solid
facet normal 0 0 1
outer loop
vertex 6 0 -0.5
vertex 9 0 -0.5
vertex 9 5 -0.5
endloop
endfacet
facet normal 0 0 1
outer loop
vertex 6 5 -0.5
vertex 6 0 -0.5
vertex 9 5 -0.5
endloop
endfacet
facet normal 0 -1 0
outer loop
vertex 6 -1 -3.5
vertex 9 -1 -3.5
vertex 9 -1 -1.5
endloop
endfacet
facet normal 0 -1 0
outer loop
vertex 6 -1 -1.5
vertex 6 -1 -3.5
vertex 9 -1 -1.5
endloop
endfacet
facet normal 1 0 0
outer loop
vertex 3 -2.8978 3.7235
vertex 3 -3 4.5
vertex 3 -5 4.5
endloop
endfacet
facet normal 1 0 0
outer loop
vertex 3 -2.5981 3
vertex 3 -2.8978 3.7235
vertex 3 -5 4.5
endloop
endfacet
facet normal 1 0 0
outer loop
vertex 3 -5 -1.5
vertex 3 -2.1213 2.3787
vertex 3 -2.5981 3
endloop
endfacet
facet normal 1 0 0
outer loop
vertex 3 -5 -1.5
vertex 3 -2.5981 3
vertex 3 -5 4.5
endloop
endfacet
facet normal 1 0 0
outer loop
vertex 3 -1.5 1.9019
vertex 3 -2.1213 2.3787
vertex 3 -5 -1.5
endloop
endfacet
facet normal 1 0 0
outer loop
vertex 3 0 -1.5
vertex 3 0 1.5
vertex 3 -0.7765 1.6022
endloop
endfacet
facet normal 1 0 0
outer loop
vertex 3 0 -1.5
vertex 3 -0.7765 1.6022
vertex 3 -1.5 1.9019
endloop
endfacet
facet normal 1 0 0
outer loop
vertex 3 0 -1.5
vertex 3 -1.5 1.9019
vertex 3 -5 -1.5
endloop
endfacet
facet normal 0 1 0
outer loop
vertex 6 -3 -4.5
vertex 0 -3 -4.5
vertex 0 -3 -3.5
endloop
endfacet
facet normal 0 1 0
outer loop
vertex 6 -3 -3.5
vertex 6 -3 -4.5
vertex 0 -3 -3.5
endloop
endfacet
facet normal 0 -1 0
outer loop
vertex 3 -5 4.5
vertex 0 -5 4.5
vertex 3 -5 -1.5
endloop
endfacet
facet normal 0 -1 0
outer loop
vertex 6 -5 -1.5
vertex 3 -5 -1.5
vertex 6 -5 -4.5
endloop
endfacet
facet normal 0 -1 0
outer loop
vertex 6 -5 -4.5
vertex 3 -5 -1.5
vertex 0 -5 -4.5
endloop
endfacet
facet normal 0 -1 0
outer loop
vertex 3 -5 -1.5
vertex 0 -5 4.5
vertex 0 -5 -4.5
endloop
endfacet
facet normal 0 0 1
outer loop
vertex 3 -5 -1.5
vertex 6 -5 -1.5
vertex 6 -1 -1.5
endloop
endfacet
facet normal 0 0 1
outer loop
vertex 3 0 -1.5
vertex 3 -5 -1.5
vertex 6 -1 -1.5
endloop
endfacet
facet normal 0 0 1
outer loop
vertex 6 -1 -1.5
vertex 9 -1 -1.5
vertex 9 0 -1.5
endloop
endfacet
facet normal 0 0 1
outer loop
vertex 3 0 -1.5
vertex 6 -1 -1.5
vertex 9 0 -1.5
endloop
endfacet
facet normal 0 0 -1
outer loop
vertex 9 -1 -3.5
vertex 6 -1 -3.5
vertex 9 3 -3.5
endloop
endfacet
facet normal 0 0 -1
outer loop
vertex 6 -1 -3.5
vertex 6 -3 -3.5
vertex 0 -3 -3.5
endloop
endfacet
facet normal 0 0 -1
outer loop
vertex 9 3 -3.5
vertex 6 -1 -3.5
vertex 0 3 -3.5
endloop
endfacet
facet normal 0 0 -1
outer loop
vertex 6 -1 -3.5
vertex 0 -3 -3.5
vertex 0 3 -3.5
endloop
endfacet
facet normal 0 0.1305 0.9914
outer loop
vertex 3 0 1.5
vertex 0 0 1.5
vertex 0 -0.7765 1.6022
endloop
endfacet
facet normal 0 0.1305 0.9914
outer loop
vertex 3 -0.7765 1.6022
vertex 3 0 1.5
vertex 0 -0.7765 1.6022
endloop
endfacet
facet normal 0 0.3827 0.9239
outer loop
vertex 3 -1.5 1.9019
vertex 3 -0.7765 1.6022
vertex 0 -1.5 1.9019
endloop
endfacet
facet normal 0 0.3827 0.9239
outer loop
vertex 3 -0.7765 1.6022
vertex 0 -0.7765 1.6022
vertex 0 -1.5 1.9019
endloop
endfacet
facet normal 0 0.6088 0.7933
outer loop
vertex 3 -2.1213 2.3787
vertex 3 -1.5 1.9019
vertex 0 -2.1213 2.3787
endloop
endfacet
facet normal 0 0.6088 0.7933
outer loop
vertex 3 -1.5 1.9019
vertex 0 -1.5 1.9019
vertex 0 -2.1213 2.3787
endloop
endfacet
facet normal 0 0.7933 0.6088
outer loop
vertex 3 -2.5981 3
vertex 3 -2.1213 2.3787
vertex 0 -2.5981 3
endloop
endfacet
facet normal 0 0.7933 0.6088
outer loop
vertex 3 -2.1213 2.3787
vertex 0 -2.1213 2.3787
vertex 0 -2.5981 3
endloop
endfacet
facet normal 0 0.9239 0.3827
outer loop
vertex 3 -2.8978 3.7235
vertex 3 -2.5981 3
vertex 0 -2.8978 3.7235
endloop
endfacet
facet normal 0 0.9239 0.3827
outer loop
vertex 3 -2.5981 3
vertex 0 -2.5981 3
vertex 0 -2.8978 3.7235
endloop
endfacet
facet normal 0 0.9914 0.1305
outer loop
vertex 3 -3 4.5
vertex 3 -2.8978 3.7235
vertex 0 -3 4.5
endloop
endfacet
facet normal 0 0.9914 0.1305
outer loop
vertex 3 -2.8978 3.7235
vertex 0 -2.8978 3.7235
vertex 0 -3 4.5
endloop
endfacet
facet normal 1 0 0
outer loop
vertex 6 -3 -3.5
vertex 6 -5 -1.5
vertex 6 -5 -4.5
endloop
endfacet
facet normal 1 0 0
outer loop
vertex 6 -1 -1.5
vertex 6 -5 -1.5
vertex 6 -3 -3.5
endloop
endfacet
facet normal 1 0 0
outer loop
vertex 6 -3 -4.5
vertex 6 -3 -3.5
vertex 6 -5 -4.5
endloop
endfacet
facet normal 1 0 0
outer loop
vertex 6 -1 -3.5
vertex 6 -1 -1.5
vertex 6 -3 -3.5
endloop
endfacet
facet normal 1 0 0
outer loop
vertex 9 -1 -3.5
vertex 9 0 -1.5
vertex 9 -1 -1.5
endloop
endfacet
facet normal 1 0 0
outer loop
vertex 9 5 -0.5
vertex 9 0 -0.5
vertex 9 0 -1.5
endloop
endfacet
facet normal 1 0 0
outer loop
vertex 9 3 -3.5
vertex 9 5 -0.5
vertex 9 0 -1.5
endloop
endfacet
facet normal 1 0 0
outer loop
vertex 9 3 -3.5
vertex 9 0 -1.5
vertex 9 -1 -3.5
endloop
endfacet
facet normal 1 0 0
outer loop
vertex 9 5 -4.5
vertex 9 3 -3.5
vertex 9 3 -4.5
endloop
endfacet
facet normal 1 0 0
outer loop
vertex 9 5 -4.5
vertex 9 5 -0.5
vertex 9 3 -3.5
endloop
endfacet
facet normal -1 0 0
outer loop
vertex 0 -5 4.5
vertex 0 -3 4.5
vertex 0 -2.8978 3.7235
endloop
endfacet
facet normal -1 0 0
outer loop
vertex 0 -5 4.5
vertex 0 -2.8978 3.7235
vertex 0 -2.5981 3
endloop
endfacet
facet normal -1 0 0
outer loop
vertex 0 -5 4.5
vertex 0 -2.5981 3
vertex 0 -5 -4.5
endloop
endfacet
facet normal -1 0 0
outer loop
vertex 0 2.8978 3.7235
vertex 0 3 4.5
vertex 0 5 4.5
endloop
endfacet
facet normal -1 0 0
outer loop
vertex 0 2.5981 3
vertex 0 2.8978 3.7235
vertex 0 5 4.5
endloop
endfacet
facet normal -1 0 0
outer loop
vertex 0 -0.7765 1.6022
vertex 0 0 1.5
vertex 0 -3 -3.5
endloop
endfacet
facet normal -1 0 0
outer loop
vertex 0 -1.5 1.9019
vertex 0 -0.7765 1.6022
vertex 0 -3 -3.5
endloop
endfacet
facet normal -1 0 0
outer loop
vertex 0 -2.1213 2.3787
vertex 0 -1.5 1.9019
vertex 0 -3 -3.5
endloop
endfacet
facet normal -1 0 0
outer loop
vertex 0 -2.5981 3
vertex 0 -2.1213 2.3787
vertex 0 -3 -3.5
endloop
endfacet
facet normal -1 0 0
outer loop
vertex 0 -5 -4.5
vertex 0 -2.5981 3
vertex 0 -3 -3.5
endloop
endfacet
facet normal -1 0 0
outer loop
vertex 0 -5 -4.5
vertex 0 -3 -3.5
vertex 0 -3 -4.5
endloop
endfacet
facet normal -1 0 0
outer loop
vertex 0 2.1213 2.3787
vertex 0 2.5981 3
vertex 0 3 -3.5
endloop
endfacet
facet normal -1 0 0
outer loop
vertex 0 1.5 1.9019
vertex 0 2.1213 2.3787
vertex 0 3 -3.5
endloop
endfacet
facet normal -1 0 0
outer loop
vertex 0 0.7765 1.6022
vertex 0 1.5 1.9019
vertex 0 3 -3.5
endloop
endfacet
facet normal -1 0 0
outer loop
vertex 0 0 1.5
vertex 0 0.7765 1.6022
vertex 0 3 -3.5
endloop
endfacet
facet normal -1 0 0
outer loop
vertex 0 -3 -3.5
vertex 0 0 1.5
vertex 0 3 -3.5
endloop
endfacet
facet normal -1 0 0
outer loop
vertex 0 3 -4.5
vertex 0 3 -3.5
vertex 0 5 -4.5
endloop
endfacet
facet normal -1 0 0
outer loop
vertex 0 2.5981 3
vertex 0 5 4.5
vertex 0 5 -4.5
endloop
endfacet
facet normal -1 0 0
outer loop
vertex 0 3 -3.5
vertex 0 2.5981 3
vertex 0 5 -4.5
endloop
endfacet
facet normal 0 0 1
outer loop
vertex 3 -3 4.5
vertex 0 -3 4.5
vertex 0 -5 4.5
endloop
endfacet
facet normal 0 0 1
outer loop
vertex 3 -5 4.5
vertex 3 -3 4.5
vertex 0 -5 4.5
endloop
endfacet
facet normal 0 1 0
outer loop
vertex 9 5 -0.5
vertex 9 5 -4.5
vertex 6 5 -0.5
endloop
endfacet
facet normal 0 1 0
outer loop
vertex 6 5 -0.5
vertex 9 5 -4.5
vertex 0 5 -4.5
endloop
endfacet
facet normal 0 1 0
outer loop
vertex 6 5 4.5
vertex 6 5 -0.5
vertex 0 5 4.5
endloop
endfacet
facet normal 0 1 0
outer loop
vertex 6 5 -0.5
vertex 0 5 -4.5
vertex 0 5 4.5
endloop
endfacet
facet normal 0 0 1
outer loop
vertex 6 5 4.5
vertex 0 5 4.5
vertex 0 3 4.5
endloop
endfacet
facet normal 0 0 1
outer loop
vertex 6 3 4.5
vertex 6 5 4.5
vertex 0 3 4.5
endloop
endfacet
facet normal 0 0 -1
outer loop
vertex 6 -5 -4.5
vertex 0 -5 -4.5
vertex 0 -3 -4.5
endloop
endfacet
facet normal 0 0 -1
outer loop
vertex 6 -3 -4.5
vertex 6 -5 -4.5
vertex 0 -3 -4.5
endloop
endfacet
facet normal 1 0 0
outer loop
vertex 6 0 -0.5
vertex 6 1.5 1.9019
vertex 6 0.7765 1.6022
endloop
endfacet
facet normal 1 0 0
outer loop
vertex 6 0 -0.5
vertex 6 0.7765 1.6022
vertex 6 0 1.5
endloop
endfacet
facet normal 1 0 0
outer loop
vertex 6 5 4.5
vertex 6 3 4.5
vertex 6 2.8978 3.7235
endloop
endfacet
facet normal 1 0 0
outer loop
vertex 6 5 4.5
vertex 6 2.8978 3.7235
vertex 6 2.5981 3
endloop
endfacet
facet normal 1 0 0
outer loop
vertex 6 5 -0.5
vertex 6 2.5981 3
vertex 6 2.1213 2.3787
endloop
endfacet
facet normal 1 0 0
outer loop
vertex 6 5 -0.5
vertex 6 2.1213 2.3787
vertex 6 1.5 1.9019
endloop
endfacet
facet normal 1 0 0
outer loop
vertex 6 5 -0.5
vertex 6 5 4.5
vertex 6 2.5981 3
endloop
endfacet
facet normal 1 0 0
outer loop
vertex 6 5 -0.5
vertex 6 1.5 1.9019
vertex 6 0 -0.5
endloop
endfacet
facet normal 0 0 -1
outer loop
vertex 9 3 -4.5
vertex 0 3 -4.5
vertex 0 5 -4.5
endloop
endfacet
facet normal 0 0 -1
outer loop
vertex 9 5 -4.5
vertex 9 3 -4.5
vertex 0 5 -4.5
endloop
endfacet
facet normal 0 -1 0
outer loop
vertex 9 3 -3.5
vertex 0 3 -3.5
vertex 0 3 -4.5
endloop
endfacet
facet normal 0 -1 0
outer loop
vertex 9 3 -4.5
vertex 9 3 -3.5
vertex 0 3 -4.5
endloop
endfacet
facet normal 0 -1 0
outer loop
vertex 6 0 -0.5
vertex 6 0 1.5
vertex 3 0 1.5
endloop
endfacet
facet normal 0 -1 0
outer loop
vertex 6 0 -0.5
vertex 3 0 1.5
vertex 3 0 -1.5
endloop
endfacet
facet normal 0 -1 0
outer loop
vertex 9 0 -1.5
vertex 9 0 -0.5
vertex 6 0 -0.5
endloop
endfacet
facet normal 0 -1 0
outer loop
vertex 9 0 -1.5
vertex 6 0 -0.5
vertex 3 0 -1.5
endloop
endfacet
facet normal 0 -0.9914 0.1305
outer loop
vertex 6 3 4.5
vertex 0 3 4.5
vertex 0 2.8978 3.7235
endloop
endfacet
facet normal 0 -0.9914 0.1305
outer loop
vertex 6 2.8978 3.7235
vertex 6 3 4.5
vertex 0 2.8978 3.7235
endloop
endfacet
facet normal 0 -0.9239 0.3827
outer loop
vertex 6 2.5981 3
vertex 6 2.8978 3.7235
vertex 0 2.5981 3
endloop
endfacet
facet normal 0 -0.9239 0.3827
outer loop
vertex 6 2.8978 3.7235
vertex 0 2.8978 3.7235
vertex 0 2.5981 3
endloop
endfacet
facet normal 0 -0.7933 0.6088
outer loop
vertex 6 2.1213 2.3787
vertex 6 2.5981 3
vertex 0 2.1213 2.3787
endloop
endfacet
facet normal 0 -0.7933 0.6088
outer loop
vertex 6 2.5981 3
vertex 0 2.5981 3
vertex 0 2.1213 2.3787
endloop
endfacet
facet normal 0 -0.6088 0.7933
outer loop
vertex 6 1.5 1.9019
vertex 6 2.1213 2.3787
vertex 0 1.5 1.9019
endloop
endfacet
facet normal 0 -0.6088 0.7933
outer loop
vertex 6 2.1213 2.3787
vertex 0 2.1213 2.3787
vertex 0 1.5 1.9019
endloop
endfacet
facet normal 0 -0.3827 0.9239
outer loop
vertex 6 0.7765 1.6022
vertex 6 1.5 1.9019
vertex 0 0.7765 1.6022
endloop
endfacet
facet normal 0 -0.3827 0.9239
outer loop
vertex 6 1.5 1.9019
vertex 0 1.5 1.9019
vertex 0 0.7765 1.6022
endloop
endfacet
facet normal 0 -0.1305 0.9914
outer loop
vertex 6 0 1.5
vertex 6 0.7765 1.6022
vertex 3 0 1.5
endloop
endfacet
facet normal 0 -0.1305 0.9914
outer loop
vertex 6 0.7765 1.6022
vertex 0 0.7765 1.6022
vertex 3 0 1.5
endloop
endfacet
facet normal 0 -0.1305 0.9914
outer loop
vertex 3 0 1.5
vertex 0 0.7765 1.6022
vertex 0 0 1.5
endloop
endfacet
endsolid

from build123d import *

# Parameters (mm, degrees)
BOSS_EXTRUDE1_DEPTH = 9
CUT_EXTRUDE1_DEPTH  = 3
SKETCH5_W           = 6
SKETCH5_H           = 5
CUT_EXTRUDE2_DEPTH  = 6


with BuildPart() as part:
    # Sketch1 → Boss-Extrude1 (new body)
    with BuildSketch(Plane(origin=(0, 0, 0), x_dir=(0, 0, -1), z_dir=(1, 0, 0))):
        with BuildLine():
            Line((-4.5, -5), (4.5, -5))
            Line((4.5, -5), (4.5, -3))
            Line((4.5, -3), (3.5, -3))
            Line((3.5, -3), (3.5, 3))
            Line((3.5, 3), (4.5, 3))
            Line((4.5, 3), (4.5, 5))
            Line((4.5, 5), (-4.5, 5))
            Line((-4.5, 5), (-4.5, 3))
            ThreePointArc((-4.5, 3), (-2.378679656, 2.121320344), (-1.5, 0))
            ThreePointArc((-1.5, 0), (-2.378679656, -2.121320344), (-4.5, -3))
            Line((-4.5, -3), (-4.5, -5))
        make_face()
    extrude(amount=BOSS_EXTRUDE1_DEPTH)

    # Sketch3 → Cut-Extrude1 (cut)
    with BuildSketch(Plane(origin=(9, 0, 0), x_dir=(0, 0, -1), z_dir=(1, 0, 0))):
        with BuildLine():
            ThreePointArc((-4.5, 3), (-2.378679656, 2.121320344), (-1.5, 0))
            Line((-1.5, 0), (0.5, 0))
            Line((0.5, 0), (0.5, 5))
            Line((0.5, 5), (-4.5, 5))
            Line((-4.5, 5), (-4.5, 3))
        make_face()
        Polygon((1.5, -1), (1.5, -5), (4.5, -5), (4.5, -3), (3.5, -3), (3.5, -1), align=None)
    extrude(amount=-CUT_EXTRUDE1_DEPTH, mode=Mode.SUBTRACT)

    # Sketch5 → Cut-Extrude2 (cut)
    with BuildSketch(Plane(origin=(9, 0, 0), x_dir=(0, 0, -1), z_dir=(1, 0, 0))):
        with Locations((-1.5, -2.5)):
            Rectangle(SKETCH5_W, SKETCH5_H)
    extrude(amount=-CUT_EXTRUDE2_DEPTH, mode=Mode.SUBTRACT)


solid = part.part
